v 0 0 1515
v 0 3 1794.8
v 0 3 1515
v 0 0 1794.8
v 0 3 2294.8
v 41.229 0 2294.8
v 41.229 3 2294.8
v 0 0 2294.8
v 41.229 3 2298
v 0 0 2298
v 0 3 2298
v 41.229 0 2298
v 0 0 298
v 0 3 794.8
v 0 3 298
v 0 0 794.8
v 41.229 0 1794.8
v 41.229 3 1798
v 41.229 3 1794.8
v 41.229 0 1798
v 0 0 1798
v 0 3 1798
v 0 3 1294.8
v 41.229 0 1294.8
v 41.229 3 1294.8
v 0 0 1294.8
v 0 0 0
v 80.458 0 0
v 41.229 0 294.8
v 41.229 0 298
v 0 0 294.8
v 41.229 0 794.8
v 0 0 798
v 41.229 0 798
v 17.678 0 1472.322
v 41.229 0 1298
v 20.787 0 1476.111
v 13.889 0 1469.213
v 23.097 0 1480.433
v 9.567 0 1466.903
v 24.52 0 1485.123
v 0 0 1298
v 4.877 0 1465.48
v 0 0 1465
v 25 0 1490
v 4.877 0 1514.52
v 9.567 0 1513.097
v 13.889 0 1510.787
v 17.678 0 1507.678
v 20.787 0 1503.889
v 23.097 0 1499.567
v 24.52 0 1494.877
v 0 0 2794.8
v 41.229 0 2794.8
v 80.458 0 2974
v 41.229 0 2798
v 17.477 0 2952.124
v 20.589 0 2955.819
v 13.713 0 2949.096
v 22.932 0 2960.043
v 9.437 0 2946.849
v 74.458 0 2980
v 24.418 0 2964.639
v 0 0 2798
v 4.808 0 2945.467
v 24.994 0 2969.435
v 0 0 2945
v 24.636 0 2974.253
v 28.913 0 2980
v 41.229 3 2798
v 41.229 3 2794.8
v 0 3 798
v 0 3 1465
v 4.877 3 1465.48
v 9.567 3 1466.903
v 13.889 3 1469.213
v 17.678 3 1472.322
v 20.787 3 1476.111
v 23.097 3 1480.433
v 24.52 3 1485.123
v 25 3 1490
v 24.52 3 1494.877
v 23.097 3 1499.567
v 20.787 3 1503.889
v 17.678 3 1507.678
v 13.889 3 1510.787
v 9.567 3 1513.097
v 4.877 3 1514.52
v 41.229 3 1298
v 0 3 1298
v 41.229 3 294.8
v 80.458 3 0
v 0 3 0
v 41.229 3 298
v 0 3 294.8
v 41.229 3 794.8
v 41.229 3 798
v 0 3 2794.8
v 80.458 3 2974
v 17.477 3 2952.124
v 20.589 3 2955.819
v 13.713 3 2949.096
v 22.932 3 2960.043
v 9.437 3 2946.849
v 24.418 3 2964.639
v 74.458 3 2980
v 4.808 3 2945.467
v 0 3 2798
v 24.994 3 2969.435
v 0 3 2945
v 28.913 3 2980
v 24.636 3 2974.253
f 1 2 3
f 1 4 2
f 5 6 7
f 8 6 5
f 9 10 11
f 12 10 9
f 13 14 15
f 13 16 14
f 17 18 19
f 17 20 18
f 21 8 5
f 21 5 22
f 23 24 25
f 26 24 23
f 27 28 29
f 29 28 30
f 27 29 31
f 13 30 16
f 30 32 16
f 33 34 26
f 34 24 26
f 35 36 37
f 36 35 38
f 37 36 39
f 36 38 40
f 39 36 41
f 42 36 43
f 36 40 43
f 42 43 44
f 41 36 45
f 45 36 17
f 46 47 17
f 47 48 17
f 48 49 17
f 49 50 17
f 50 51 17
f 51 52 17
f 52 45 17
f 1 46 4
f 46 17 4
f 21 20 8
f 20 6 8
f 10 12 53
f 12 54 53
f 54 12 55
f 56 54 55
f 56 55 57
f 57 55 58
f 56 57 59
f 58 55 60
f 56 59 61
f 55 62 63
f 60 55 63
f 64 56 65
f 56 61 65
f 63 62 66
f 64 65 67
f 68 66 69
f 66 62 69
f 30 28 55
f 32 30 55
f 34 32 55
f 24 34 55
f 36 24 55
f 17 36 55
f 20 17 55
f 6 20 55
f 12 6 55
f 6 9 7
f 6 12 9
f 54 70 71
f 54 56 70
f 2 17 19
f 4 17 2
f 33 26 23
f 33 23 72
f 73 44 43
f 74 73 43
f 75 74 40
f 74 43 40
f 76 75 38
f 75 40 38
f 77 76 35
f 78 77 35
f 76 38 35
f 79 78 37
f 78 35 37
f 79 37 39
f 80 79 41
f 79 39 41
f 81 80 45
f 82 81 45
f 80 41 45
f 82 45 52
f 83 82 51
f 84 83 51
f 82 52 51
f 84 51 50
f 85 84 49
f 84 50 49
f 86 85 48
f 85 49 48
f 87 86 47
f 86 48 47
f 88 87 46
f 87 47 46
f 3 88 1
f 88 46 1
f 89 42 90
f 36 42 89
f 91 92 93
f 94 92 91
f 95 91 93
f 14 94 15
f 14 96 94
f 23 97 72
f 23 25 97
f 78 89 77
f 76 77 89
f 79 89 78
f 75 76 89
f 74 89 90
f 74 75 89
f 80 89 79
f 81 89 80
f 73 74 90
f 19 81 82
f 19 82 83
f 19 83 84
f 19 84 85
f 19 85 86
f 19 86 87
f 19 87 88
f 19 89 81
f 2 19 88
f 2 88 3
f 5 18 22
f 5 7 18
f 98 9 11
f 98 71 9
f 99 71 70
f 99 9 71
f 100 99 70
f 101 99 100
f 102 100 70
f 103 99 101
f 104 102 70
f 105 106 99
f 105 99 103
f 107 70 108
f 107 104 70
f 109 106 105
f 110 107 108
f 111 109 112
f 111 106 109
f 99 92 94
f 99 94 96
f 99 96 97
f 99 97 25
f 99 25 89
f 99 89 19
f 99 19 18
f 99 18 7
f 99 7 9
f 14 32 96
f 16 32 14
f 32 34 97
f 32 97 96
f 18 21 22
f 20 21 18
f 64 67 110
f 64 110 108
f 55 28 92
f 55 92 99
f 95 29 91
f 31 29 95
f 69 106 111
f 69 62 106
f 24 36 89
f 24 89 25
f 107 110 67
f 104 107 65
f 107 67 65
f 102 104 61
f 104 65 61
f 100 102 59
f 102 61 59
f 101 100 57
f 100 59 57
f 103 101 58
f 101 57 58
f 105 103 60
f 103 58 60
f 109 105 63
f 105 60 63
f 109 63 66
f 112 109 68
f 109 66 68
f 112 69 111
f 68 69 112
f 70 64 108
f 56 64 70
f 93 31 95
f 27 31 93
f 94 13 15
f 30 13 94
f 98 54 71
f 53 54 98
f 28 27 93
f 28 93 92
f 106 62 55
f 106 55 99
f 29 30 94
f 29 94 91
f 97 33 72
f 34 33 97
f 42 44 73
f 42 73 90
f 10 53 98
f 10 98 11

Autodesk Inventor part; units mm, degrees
ref_plane "YZ Plane" through (0, 0, 0) normal (1, 0, 0) x (0, 1, 0)
ref_plane "XZ Plane" through (0, 0, 0) normal (0, 1, 0) x (-1, 0, 0)
ref_plane "XY Plane" through (0, 0, 0) normal (0, 0, 1) x (1, 0, 0)
sketch "Sketch6" plane through (0, 0, 0) normal (0, 1, 0) x (-1, 0, 0)
  line L0 (0, 0) -> (-80.4576, 0)
  line L1 (-80.4576, 0) -> (-80.4576, 2980)
  line L2 (-80.4576, 2980) -> (0, 2980)
  line L3 (0, 2980) -> (0, 0)
  dimension "d26" = 80.4576
  dimension "d27" = 2980
extrude "Plate4" add sketch "Sketch6" along normal blind 3
sketch "Sketch9" plane through (0, 3, 0) normal (0, 1, 0) x (1, 0, 0)
  line L0 (0, -2980) -> (0, 0) projected
  line L1 (80.4576, -2980) -> (0, -2980) projected
  line L2 (80.4576, 0) -> (80.4576, -2980) projected
  line L3 (0, 0) -> (80.4576, 0) projected
  line L4 (25, -2762.0797) -> (10, -2762.0797) construction
  line L5 (10, -2762.0797) -> (10, -2562.0797) construction
  line L6 (10, -2562.0797) -> (25, -2562.0797) construction
  line L7 (25, -2562.0797) -> (25, -2762.0797) construction
  dimension "d44" = 200
  dimension "d45" = 15
  dimension "d47" = 10
mark "Mark1"
sketch "Sketch7" plane through (0, 0, 0) normal (0, -1, 0) x (1, 0, 0)
  line L0 (0, 2980) -> (80.4576, 2980) projected
  line L1 (0, 0) -> (0, 2980) projected
  line L2 (80.4576, 0) -> (0, 0) projected
  line L3 (80.4576, 2980) -> (80.4576, 0) projected
  line L4 (0, 2798) -> (41.2288, 2798)
  line L5 (41.2288, 2798) -> (41.2288, 2794.8)
  line L6 (41.2288, 2794.8) -> (0, 2794.8)
  line L7 (0, 2794.8) -> (0, 2798)
  point P0 (0, 2794.8)
  point P1 (0, 200)
  point P2 (46.4173, 200)
  point P3 (0, 2794.8)
  dimension "d29" = 41.2288
  dimension "d30" = 3.2
  dimension "d51" = 182
extrude "Extrusion2" cut sketch "Sketch7" against normal through all contours L4 L5 L6 L1
pattern_linear "Rectangular Pattern1" count 6 spacing 500 along (0, 0, -1) of "Extrusion2"
sketch "Sketch8" plane through (0, 0, 0) normal (0, -1, 0) x (1, 0, 0)
  line L0 (0, 2798) -> (41.2288, 2798) projected
  line L1 (41.2288, 2798) -> (41.2288, 2794.8) projected
  line L2 (41.2288, 2794.8) -> (0, 2794.8) projected
  line L3 (0, 0) -> (0, 294.8) projected
  line L4 (80.4576, 0) -> (0, 0) projected
  line L5 (80.4576, 2980) -> (80.4576, 0) projected
  line L6 (0, 2980) -> (80.4576, 2980) projected
  circle A0 centre (0, 1490) radius 25
  line L7 (0, 2798) -> (0, 2980) projected
  line L8 (0, 298) -> (41.2288, 298) projected
  line L9 (41.2288, 298) -> (41.2288, 294.8) projected
  line L10 (41.2288, 294.8) -> (0, 294.8) projected
  line L11 (0, 2298) -> (0, 2794.8) projected
  line L12 (0, 2298) -> (41.2288, 2298) projected
  line L13 (41.2288, 2298) -> (41.2288, 2294.8) projected
  line L14 (41.2288, 2294.8) -> (0, 2294.8) projected
  line L15 (0, 1798) -> (0, 2294.8) projected
  line L16 (0, 1798) -> (41.2288, 1798) projected
  line L17 (41.2288, 1798) -> (41.2288, 1794.8) projected
  line L18 (41.2288, 1794.8) -> (0, 1794.8) projected
  line L19 (0, 1298) -> (0, 1794.8) projected
  line L20 (0, 1298) -> (41.2288, 1298) projected
  line L21 (41.2288, 1298) -> (41.2288, 1294.8) projected
  line L22 (41.2288, 1294.8) -> (0, 1294.8) projected
  line L23 (0, 798) -> (0, 1294.8) projected
  line L24 (0, 798) -> (41.2288, 798) projected
  line L25 (41.2288, 798) -> (41.2288, 794.8) projected
  line L26 (41.2288, 794.8) -> (0, 794.8) projected
  line L27 (0, 298) -> (0, 794.8) projected
  dimension "d37" = 50
  dimension "d38" = 1490
extrude "Extrusion3" cut sketch "Sketch8" against normal through all contours L19 A0 | A0 L19
pattern_linear "Rectangular Pattern2" count 2 spacing 1480 along (0, 0, 1) of "Extrusion3"
chamfer "Corner Chamfer1" distance 6 angle 45 2 edges at (22.9129, 1.5, 2980) (80.4576, 1.5, 2980)
equation "\"d28\" = Thickness"
equation "\"BendReliefWidth\" = Thickness"
equation "\"BendReliefDepth\" = 0.5 * Thickness"
equation "\"CornerReliefSize\" = 4 * Thickness"
equation "\"MinimumRemnant\" = 2 * Thickness"
equation "\"TransitionRadius\" = BendRadius"
equation "\"JacobiRadiusSize\" = BendRadius"
equation "\"GapSize\" = Thickness"
equation "\"Thickness\" = 3"
equation "\"BendRadius\" = 5"
properties part number "BSH 0341 stringer board 2" material "09g2s"
